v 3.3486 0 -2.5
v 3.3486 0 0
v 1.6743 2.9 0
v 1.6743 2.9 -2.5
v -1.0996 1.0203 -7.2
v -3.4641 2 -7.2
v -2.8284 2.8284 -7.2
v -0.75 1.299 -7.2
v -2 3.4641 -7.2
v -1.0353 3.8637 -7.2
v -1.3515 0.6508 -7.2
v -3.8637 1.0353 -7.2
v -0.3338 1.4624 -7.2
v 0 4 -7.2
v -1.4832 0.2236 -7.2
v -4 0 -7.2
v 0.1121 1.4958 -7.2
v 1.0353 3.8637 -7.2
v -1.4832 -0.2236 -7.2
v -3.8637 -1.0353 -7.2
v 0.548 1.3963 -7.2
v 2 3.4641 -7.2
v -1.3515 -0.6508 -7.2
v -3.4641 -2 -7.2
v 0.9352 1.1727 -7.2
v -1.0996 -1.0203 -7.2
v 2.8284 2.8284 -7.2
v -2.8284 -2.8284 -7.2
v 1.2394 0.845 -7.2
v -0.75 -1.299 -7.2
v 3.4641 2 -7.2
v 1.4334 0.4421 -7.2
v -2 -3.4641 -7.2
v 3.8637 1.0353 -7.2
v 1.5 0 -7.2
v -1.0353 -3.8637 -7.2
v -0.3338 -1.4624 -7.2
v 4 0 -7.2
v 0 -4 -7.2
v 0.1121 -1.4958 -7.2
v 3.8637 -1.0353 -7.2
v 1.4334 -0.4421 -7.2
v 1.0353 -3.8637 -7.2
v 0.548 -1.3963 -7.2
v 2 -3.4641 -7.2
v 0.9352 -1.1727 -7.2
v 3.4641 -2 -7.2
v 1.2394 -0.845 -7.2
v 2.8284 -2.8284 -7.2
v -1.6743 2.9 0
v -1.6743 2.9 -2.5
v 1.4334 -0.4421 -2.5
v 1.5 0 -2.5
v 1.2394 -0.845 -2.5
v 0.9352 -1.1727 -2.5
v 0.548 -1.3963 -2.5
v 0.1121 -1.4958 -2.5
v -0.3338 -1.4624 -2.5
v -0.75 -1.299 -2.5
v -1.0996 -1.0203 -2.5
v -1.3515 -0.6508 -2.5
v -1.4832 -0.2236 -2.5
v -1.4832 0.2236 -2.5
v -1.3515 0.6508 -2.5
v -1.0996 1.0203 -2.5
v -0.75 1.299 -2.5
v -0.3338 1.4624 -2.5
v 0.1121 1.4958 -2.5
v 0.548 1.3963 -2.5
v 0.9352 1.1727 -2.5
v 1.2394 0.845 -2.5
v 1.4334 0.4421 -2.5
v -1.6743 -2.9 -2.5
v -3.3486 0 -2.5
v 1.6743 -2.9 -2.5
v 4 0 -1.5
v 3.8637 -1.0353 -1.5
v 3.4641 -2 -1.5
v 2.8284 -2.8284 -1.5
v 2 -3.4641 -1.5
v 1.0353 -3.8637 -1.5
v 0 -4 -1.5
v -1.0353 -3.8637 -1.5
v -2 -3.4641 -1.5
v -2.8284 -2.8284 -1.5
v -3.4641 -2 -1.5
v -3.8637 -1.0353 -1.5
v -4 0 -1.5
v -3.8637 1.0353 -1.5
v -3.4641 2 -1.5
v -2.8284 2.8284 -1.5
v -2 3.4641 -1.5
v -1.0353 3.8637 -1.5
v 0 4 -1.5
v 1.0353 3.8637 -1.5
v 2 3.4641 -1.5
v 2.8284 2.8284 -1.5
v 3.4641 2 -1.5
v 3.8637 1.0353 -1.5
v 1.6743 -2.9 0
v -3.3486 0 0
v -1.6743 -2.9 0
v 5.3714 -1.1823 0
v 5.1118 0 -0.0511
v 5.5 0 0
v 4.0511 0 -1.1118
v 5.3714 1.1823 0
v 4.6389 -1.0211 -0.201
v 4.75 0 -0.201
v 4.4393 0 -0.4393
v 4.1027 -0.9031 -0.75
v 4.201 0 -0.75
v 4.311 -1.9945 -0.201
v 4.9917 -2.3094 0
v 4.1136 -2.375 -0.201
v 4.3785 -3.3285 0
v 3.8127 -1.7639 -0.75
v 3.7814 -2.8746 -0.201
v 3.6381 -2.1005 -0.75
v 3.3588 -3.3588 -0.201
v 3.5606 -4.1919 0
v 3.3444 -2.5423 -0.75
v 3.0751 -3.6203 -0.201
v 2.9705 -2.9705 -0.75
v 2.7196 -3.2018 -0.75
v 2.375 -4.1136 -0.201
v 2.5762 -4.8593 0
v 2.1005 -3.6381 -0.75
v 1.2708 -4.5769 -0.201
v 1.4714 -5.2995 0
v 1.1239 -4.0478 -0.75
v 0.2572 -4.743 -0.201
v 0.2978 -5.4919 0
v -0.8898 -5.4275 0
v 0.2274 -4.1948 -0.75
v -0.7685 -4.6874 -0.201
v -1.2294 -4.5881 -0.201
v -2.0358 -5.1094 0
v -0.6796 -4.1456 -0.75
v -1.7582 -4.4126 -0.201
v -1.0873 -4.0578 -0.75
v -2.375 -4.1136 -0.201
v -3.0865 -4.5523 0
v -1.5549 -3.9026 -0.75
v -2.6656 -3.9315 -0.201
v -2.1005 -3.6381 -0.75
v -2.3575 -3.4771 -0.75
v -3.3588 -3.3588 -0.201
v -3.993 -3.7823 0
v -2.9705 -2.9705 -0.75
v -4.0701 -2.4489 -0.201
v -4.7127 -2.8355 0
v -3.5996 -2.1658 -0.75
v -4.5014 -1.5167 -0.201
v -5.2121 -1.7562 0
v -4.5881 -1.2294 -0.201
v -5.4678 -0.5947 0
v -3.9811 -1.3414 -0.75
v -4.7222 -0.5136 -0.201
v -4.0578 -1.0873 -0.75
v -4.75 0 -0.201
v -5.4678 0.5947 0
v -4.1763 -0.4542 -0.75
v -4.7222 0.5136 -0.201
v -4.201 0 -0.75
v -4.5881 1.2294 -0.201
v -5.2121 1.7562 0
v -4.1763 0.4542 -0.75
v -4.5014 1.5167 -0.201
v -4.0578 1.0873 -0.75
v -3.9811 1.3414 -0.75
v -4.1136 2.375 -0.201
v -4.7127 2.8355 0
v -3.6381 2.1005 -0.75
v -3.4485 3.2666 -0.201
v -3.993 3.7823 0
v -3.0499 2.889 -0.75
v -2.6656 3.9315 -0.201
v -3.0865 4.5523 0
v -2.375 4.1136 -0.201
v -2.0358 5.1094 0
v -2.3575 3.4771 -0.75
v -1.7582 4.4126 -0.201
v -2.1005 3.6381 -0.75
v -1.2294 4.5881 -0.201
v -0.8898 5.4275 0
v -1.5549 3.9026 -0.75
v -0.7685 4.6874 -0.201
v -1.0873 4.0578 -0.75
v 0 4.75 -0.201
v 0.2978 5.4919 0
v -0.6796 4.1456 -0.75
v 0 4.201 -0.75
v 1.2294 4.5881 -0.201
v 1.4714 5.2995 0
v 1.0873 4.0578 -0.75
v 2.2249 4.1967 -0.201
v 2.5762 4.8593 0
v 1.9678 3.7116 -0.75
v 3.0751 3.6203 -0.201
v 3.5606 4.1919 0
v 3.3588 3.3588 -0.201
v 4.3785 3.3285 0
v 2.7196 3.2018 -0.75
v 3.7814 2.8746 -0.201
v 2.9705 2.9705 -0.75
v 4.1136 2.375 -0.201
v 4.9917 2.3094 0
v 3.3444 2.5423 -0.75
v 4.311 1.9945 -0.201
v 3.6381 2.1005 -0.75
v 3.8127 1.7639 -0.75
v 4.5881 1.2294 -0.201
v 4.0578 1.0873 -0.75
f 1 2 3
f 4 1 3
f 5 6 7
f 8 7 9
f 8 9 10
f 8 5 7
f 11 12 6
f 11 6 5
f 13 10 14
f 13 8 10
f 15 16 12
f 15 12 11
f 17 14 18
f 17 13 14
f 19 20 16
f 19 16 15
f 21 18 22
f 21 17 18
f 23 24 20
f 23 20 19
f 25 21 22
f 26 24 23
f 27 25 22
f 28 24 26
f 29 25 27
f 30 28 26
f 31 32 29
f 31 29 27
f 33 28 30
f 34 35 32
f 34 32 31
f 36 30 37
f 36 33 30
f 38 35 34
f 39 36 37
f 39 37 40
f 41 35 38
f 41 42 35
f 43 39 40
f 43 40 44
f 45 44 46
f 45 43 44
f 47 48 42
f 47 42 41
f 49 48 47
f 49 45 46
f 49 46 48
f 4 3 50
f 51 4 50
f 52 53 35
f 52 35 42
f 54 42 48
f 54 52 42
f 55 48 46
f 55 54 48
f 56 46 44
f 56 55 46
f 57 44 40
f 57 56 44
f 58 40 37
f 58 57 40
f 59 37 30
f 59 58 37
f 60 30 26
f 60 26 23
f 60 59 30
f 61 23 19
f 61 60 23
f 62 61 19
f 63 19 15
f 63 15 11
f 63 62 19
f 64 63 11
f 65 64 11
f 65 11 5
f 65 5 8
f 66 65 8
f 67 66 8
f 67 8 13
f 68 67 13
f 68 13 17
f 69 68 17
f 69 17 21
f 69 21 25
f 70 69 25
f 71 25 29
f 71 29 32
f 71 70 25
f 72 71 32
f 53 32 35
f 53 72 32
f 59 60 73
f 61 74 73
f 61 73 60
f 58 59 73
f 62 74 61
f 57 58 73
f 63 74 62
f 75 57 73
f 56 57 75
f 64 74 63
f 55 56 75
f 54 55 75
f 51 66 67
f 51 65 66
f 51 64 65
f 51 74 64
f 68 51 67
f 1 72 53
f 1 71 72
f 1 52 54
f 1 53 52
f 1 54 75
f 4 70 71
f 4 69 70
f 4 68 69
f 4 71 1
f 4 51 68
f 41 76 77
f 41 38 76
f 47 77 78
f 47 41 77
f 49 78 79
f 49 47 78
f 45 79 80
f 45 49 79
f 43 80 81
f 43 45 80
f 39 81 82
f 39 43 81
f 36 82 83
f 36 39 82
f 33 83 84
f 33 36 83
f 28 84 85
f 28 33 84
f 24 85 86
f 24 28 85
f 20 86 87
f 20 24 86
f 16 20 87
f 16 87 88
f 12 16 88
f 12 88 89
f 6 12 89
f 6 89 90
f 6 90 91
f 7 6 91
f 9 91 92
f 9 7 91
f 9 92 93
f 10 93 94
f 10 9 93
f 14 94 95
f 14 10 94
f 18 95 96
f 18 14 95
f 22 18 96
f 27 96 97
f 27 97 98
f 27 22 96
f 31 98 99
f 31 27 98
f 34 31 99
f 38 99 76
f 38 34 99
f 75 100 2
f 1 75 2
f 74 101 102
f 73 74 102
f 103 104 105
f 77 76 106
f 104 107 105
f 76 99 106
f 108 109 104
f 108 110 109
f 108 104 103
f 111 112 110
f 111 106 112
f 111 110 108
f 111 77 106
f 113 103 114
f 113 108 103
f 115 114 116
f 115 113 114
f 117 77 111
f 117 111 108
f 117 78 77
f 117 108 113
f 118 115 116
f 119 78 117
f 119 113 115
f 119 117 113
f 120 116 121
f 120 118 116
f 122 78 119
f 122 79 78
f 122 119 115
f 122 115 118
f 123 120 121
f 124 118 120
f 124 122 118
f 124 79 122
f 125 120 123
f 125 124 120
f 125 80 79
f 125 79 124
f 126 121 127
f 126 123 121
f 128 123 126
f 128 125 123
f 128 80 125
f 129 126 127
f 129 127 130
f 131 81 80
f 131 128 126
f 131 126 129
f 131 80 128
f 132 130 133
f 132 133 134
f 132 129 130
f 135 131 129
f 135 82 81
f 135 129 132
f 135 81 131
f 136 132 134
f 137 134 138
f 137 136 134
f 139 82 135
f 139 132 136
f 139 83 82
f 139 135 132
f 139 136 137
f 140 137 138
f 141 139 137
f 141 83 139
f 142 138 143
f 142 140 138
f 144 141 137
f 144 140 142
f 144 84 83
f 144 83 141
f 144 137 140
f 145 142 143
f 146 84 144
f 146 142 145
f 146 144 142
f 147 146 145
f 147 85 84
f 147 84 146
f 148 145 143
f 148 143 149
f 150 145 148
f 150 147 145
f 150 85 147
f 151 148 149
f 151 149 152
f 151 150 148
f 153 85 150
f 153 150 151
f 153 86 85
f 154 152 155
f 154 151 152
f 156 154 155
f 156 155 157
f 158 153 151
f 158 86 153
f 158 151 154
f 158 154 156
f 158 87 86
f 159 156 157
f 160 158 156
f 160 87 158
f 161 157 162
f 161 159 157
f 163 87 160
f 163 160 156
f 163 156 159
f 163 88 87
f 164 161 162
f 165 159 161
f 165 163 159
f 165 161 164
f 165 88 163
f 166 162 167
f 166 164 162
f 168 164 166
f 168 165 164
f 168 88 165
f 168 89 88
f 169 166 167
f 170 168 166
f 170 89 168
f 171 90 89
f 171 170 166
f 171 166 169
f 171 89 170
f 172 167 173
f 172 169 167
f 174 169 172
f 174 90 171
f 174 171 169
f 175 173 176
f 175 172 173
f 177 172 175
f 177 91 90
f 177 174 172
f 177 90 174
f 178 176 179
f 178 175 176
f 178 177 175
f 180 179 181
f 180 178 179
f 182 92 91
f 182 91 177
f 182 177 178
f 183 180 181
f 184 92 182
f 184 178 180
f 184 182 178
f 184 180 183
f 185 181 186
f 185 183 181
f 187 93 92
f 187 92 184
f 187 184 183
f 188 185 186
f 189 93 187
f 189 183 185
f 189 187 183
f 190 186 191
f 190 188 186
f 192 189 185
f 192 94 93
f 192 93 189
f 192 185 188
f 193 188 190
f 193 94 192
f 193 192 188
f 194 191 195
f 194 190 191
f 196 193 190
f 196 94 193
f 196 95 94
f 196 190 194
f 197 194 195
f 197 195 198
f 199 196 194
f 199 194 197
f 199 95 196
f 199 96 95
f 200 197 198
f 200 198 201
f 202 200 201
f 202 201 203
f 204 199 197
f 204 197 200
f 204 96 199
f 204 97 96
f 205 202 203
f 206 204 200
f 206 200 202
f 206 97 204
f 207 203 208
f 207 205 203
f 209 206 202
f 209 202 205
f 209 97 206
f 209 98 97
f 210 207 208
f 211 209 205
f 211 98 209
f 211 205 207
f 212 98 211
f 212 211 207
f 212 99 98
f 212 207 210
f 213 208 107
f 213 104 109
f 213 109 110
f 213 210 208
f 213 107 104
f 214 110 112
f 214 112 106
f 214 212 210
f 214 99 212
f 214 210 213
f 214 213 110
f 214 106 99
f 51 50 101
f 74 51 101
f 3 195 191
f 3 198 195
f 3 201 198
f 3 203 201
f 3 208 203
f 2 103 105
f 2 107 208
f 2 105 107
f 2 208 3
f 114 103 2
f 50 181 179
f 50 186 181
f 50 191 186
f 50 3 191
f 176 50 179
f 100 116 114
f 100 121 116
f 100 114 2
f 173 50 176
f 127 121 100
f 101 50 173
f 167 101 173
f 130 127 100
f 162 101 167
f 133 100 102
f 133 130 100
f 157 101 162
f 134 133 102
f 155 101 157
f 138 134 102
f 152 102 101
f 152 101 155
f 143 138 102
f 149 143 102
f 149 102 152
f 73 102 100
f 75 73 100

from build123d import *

# Parameters (mm, degrees)
CUT_EXTRUDE1_DEPTH = 2.5


with BuildPart() as part:
    # Sketch1 → Revolve1 (revolve)
    with BuildSketch(Plane(origin=(0, 0, 0), x_dir=(1, 0, 0), z_dir=(0, 1, 0)), mode=Mode.PRIVATE) as revolve1_sk:
        with BuildLine():
            Line((-1.5, 0), (-4, 0))
            Line((-4, 0), (-5.5, 0))
            ThreePointArc((-5.5, 0), (-4.439339828, 0.439339828), (-4, 1.5))
            Line((-4, 1.5), (-4, 7.2))
            Line((-4, 7.2), (-1.5, 7.2))
            Line((-1.5, 7.2), (-1.5, 0))
        make_face()
    revolve(revolve1_sk.sketch.rotate(Axis((0, 0, 0), (0, 0, -1)), 180), axis=Axis((0, 0, 0), (0, 0, -1)))

    # Sketch2 → Cut-Extrude1 (cut)
    with BuildSketch(Plane.XY):
        Polygon((1.674315781, 2.9), (-1.674315781, 2.9), (-3.348631561, 0), (-1.674315781, -2.9), (1.674315781, -2.9), (3.348631561, 0), align=None)
    extrude(amount=-CUT_EXTRUDE1_DEPTH, mode=Mode.SUBTRACT)


solid = part.part
